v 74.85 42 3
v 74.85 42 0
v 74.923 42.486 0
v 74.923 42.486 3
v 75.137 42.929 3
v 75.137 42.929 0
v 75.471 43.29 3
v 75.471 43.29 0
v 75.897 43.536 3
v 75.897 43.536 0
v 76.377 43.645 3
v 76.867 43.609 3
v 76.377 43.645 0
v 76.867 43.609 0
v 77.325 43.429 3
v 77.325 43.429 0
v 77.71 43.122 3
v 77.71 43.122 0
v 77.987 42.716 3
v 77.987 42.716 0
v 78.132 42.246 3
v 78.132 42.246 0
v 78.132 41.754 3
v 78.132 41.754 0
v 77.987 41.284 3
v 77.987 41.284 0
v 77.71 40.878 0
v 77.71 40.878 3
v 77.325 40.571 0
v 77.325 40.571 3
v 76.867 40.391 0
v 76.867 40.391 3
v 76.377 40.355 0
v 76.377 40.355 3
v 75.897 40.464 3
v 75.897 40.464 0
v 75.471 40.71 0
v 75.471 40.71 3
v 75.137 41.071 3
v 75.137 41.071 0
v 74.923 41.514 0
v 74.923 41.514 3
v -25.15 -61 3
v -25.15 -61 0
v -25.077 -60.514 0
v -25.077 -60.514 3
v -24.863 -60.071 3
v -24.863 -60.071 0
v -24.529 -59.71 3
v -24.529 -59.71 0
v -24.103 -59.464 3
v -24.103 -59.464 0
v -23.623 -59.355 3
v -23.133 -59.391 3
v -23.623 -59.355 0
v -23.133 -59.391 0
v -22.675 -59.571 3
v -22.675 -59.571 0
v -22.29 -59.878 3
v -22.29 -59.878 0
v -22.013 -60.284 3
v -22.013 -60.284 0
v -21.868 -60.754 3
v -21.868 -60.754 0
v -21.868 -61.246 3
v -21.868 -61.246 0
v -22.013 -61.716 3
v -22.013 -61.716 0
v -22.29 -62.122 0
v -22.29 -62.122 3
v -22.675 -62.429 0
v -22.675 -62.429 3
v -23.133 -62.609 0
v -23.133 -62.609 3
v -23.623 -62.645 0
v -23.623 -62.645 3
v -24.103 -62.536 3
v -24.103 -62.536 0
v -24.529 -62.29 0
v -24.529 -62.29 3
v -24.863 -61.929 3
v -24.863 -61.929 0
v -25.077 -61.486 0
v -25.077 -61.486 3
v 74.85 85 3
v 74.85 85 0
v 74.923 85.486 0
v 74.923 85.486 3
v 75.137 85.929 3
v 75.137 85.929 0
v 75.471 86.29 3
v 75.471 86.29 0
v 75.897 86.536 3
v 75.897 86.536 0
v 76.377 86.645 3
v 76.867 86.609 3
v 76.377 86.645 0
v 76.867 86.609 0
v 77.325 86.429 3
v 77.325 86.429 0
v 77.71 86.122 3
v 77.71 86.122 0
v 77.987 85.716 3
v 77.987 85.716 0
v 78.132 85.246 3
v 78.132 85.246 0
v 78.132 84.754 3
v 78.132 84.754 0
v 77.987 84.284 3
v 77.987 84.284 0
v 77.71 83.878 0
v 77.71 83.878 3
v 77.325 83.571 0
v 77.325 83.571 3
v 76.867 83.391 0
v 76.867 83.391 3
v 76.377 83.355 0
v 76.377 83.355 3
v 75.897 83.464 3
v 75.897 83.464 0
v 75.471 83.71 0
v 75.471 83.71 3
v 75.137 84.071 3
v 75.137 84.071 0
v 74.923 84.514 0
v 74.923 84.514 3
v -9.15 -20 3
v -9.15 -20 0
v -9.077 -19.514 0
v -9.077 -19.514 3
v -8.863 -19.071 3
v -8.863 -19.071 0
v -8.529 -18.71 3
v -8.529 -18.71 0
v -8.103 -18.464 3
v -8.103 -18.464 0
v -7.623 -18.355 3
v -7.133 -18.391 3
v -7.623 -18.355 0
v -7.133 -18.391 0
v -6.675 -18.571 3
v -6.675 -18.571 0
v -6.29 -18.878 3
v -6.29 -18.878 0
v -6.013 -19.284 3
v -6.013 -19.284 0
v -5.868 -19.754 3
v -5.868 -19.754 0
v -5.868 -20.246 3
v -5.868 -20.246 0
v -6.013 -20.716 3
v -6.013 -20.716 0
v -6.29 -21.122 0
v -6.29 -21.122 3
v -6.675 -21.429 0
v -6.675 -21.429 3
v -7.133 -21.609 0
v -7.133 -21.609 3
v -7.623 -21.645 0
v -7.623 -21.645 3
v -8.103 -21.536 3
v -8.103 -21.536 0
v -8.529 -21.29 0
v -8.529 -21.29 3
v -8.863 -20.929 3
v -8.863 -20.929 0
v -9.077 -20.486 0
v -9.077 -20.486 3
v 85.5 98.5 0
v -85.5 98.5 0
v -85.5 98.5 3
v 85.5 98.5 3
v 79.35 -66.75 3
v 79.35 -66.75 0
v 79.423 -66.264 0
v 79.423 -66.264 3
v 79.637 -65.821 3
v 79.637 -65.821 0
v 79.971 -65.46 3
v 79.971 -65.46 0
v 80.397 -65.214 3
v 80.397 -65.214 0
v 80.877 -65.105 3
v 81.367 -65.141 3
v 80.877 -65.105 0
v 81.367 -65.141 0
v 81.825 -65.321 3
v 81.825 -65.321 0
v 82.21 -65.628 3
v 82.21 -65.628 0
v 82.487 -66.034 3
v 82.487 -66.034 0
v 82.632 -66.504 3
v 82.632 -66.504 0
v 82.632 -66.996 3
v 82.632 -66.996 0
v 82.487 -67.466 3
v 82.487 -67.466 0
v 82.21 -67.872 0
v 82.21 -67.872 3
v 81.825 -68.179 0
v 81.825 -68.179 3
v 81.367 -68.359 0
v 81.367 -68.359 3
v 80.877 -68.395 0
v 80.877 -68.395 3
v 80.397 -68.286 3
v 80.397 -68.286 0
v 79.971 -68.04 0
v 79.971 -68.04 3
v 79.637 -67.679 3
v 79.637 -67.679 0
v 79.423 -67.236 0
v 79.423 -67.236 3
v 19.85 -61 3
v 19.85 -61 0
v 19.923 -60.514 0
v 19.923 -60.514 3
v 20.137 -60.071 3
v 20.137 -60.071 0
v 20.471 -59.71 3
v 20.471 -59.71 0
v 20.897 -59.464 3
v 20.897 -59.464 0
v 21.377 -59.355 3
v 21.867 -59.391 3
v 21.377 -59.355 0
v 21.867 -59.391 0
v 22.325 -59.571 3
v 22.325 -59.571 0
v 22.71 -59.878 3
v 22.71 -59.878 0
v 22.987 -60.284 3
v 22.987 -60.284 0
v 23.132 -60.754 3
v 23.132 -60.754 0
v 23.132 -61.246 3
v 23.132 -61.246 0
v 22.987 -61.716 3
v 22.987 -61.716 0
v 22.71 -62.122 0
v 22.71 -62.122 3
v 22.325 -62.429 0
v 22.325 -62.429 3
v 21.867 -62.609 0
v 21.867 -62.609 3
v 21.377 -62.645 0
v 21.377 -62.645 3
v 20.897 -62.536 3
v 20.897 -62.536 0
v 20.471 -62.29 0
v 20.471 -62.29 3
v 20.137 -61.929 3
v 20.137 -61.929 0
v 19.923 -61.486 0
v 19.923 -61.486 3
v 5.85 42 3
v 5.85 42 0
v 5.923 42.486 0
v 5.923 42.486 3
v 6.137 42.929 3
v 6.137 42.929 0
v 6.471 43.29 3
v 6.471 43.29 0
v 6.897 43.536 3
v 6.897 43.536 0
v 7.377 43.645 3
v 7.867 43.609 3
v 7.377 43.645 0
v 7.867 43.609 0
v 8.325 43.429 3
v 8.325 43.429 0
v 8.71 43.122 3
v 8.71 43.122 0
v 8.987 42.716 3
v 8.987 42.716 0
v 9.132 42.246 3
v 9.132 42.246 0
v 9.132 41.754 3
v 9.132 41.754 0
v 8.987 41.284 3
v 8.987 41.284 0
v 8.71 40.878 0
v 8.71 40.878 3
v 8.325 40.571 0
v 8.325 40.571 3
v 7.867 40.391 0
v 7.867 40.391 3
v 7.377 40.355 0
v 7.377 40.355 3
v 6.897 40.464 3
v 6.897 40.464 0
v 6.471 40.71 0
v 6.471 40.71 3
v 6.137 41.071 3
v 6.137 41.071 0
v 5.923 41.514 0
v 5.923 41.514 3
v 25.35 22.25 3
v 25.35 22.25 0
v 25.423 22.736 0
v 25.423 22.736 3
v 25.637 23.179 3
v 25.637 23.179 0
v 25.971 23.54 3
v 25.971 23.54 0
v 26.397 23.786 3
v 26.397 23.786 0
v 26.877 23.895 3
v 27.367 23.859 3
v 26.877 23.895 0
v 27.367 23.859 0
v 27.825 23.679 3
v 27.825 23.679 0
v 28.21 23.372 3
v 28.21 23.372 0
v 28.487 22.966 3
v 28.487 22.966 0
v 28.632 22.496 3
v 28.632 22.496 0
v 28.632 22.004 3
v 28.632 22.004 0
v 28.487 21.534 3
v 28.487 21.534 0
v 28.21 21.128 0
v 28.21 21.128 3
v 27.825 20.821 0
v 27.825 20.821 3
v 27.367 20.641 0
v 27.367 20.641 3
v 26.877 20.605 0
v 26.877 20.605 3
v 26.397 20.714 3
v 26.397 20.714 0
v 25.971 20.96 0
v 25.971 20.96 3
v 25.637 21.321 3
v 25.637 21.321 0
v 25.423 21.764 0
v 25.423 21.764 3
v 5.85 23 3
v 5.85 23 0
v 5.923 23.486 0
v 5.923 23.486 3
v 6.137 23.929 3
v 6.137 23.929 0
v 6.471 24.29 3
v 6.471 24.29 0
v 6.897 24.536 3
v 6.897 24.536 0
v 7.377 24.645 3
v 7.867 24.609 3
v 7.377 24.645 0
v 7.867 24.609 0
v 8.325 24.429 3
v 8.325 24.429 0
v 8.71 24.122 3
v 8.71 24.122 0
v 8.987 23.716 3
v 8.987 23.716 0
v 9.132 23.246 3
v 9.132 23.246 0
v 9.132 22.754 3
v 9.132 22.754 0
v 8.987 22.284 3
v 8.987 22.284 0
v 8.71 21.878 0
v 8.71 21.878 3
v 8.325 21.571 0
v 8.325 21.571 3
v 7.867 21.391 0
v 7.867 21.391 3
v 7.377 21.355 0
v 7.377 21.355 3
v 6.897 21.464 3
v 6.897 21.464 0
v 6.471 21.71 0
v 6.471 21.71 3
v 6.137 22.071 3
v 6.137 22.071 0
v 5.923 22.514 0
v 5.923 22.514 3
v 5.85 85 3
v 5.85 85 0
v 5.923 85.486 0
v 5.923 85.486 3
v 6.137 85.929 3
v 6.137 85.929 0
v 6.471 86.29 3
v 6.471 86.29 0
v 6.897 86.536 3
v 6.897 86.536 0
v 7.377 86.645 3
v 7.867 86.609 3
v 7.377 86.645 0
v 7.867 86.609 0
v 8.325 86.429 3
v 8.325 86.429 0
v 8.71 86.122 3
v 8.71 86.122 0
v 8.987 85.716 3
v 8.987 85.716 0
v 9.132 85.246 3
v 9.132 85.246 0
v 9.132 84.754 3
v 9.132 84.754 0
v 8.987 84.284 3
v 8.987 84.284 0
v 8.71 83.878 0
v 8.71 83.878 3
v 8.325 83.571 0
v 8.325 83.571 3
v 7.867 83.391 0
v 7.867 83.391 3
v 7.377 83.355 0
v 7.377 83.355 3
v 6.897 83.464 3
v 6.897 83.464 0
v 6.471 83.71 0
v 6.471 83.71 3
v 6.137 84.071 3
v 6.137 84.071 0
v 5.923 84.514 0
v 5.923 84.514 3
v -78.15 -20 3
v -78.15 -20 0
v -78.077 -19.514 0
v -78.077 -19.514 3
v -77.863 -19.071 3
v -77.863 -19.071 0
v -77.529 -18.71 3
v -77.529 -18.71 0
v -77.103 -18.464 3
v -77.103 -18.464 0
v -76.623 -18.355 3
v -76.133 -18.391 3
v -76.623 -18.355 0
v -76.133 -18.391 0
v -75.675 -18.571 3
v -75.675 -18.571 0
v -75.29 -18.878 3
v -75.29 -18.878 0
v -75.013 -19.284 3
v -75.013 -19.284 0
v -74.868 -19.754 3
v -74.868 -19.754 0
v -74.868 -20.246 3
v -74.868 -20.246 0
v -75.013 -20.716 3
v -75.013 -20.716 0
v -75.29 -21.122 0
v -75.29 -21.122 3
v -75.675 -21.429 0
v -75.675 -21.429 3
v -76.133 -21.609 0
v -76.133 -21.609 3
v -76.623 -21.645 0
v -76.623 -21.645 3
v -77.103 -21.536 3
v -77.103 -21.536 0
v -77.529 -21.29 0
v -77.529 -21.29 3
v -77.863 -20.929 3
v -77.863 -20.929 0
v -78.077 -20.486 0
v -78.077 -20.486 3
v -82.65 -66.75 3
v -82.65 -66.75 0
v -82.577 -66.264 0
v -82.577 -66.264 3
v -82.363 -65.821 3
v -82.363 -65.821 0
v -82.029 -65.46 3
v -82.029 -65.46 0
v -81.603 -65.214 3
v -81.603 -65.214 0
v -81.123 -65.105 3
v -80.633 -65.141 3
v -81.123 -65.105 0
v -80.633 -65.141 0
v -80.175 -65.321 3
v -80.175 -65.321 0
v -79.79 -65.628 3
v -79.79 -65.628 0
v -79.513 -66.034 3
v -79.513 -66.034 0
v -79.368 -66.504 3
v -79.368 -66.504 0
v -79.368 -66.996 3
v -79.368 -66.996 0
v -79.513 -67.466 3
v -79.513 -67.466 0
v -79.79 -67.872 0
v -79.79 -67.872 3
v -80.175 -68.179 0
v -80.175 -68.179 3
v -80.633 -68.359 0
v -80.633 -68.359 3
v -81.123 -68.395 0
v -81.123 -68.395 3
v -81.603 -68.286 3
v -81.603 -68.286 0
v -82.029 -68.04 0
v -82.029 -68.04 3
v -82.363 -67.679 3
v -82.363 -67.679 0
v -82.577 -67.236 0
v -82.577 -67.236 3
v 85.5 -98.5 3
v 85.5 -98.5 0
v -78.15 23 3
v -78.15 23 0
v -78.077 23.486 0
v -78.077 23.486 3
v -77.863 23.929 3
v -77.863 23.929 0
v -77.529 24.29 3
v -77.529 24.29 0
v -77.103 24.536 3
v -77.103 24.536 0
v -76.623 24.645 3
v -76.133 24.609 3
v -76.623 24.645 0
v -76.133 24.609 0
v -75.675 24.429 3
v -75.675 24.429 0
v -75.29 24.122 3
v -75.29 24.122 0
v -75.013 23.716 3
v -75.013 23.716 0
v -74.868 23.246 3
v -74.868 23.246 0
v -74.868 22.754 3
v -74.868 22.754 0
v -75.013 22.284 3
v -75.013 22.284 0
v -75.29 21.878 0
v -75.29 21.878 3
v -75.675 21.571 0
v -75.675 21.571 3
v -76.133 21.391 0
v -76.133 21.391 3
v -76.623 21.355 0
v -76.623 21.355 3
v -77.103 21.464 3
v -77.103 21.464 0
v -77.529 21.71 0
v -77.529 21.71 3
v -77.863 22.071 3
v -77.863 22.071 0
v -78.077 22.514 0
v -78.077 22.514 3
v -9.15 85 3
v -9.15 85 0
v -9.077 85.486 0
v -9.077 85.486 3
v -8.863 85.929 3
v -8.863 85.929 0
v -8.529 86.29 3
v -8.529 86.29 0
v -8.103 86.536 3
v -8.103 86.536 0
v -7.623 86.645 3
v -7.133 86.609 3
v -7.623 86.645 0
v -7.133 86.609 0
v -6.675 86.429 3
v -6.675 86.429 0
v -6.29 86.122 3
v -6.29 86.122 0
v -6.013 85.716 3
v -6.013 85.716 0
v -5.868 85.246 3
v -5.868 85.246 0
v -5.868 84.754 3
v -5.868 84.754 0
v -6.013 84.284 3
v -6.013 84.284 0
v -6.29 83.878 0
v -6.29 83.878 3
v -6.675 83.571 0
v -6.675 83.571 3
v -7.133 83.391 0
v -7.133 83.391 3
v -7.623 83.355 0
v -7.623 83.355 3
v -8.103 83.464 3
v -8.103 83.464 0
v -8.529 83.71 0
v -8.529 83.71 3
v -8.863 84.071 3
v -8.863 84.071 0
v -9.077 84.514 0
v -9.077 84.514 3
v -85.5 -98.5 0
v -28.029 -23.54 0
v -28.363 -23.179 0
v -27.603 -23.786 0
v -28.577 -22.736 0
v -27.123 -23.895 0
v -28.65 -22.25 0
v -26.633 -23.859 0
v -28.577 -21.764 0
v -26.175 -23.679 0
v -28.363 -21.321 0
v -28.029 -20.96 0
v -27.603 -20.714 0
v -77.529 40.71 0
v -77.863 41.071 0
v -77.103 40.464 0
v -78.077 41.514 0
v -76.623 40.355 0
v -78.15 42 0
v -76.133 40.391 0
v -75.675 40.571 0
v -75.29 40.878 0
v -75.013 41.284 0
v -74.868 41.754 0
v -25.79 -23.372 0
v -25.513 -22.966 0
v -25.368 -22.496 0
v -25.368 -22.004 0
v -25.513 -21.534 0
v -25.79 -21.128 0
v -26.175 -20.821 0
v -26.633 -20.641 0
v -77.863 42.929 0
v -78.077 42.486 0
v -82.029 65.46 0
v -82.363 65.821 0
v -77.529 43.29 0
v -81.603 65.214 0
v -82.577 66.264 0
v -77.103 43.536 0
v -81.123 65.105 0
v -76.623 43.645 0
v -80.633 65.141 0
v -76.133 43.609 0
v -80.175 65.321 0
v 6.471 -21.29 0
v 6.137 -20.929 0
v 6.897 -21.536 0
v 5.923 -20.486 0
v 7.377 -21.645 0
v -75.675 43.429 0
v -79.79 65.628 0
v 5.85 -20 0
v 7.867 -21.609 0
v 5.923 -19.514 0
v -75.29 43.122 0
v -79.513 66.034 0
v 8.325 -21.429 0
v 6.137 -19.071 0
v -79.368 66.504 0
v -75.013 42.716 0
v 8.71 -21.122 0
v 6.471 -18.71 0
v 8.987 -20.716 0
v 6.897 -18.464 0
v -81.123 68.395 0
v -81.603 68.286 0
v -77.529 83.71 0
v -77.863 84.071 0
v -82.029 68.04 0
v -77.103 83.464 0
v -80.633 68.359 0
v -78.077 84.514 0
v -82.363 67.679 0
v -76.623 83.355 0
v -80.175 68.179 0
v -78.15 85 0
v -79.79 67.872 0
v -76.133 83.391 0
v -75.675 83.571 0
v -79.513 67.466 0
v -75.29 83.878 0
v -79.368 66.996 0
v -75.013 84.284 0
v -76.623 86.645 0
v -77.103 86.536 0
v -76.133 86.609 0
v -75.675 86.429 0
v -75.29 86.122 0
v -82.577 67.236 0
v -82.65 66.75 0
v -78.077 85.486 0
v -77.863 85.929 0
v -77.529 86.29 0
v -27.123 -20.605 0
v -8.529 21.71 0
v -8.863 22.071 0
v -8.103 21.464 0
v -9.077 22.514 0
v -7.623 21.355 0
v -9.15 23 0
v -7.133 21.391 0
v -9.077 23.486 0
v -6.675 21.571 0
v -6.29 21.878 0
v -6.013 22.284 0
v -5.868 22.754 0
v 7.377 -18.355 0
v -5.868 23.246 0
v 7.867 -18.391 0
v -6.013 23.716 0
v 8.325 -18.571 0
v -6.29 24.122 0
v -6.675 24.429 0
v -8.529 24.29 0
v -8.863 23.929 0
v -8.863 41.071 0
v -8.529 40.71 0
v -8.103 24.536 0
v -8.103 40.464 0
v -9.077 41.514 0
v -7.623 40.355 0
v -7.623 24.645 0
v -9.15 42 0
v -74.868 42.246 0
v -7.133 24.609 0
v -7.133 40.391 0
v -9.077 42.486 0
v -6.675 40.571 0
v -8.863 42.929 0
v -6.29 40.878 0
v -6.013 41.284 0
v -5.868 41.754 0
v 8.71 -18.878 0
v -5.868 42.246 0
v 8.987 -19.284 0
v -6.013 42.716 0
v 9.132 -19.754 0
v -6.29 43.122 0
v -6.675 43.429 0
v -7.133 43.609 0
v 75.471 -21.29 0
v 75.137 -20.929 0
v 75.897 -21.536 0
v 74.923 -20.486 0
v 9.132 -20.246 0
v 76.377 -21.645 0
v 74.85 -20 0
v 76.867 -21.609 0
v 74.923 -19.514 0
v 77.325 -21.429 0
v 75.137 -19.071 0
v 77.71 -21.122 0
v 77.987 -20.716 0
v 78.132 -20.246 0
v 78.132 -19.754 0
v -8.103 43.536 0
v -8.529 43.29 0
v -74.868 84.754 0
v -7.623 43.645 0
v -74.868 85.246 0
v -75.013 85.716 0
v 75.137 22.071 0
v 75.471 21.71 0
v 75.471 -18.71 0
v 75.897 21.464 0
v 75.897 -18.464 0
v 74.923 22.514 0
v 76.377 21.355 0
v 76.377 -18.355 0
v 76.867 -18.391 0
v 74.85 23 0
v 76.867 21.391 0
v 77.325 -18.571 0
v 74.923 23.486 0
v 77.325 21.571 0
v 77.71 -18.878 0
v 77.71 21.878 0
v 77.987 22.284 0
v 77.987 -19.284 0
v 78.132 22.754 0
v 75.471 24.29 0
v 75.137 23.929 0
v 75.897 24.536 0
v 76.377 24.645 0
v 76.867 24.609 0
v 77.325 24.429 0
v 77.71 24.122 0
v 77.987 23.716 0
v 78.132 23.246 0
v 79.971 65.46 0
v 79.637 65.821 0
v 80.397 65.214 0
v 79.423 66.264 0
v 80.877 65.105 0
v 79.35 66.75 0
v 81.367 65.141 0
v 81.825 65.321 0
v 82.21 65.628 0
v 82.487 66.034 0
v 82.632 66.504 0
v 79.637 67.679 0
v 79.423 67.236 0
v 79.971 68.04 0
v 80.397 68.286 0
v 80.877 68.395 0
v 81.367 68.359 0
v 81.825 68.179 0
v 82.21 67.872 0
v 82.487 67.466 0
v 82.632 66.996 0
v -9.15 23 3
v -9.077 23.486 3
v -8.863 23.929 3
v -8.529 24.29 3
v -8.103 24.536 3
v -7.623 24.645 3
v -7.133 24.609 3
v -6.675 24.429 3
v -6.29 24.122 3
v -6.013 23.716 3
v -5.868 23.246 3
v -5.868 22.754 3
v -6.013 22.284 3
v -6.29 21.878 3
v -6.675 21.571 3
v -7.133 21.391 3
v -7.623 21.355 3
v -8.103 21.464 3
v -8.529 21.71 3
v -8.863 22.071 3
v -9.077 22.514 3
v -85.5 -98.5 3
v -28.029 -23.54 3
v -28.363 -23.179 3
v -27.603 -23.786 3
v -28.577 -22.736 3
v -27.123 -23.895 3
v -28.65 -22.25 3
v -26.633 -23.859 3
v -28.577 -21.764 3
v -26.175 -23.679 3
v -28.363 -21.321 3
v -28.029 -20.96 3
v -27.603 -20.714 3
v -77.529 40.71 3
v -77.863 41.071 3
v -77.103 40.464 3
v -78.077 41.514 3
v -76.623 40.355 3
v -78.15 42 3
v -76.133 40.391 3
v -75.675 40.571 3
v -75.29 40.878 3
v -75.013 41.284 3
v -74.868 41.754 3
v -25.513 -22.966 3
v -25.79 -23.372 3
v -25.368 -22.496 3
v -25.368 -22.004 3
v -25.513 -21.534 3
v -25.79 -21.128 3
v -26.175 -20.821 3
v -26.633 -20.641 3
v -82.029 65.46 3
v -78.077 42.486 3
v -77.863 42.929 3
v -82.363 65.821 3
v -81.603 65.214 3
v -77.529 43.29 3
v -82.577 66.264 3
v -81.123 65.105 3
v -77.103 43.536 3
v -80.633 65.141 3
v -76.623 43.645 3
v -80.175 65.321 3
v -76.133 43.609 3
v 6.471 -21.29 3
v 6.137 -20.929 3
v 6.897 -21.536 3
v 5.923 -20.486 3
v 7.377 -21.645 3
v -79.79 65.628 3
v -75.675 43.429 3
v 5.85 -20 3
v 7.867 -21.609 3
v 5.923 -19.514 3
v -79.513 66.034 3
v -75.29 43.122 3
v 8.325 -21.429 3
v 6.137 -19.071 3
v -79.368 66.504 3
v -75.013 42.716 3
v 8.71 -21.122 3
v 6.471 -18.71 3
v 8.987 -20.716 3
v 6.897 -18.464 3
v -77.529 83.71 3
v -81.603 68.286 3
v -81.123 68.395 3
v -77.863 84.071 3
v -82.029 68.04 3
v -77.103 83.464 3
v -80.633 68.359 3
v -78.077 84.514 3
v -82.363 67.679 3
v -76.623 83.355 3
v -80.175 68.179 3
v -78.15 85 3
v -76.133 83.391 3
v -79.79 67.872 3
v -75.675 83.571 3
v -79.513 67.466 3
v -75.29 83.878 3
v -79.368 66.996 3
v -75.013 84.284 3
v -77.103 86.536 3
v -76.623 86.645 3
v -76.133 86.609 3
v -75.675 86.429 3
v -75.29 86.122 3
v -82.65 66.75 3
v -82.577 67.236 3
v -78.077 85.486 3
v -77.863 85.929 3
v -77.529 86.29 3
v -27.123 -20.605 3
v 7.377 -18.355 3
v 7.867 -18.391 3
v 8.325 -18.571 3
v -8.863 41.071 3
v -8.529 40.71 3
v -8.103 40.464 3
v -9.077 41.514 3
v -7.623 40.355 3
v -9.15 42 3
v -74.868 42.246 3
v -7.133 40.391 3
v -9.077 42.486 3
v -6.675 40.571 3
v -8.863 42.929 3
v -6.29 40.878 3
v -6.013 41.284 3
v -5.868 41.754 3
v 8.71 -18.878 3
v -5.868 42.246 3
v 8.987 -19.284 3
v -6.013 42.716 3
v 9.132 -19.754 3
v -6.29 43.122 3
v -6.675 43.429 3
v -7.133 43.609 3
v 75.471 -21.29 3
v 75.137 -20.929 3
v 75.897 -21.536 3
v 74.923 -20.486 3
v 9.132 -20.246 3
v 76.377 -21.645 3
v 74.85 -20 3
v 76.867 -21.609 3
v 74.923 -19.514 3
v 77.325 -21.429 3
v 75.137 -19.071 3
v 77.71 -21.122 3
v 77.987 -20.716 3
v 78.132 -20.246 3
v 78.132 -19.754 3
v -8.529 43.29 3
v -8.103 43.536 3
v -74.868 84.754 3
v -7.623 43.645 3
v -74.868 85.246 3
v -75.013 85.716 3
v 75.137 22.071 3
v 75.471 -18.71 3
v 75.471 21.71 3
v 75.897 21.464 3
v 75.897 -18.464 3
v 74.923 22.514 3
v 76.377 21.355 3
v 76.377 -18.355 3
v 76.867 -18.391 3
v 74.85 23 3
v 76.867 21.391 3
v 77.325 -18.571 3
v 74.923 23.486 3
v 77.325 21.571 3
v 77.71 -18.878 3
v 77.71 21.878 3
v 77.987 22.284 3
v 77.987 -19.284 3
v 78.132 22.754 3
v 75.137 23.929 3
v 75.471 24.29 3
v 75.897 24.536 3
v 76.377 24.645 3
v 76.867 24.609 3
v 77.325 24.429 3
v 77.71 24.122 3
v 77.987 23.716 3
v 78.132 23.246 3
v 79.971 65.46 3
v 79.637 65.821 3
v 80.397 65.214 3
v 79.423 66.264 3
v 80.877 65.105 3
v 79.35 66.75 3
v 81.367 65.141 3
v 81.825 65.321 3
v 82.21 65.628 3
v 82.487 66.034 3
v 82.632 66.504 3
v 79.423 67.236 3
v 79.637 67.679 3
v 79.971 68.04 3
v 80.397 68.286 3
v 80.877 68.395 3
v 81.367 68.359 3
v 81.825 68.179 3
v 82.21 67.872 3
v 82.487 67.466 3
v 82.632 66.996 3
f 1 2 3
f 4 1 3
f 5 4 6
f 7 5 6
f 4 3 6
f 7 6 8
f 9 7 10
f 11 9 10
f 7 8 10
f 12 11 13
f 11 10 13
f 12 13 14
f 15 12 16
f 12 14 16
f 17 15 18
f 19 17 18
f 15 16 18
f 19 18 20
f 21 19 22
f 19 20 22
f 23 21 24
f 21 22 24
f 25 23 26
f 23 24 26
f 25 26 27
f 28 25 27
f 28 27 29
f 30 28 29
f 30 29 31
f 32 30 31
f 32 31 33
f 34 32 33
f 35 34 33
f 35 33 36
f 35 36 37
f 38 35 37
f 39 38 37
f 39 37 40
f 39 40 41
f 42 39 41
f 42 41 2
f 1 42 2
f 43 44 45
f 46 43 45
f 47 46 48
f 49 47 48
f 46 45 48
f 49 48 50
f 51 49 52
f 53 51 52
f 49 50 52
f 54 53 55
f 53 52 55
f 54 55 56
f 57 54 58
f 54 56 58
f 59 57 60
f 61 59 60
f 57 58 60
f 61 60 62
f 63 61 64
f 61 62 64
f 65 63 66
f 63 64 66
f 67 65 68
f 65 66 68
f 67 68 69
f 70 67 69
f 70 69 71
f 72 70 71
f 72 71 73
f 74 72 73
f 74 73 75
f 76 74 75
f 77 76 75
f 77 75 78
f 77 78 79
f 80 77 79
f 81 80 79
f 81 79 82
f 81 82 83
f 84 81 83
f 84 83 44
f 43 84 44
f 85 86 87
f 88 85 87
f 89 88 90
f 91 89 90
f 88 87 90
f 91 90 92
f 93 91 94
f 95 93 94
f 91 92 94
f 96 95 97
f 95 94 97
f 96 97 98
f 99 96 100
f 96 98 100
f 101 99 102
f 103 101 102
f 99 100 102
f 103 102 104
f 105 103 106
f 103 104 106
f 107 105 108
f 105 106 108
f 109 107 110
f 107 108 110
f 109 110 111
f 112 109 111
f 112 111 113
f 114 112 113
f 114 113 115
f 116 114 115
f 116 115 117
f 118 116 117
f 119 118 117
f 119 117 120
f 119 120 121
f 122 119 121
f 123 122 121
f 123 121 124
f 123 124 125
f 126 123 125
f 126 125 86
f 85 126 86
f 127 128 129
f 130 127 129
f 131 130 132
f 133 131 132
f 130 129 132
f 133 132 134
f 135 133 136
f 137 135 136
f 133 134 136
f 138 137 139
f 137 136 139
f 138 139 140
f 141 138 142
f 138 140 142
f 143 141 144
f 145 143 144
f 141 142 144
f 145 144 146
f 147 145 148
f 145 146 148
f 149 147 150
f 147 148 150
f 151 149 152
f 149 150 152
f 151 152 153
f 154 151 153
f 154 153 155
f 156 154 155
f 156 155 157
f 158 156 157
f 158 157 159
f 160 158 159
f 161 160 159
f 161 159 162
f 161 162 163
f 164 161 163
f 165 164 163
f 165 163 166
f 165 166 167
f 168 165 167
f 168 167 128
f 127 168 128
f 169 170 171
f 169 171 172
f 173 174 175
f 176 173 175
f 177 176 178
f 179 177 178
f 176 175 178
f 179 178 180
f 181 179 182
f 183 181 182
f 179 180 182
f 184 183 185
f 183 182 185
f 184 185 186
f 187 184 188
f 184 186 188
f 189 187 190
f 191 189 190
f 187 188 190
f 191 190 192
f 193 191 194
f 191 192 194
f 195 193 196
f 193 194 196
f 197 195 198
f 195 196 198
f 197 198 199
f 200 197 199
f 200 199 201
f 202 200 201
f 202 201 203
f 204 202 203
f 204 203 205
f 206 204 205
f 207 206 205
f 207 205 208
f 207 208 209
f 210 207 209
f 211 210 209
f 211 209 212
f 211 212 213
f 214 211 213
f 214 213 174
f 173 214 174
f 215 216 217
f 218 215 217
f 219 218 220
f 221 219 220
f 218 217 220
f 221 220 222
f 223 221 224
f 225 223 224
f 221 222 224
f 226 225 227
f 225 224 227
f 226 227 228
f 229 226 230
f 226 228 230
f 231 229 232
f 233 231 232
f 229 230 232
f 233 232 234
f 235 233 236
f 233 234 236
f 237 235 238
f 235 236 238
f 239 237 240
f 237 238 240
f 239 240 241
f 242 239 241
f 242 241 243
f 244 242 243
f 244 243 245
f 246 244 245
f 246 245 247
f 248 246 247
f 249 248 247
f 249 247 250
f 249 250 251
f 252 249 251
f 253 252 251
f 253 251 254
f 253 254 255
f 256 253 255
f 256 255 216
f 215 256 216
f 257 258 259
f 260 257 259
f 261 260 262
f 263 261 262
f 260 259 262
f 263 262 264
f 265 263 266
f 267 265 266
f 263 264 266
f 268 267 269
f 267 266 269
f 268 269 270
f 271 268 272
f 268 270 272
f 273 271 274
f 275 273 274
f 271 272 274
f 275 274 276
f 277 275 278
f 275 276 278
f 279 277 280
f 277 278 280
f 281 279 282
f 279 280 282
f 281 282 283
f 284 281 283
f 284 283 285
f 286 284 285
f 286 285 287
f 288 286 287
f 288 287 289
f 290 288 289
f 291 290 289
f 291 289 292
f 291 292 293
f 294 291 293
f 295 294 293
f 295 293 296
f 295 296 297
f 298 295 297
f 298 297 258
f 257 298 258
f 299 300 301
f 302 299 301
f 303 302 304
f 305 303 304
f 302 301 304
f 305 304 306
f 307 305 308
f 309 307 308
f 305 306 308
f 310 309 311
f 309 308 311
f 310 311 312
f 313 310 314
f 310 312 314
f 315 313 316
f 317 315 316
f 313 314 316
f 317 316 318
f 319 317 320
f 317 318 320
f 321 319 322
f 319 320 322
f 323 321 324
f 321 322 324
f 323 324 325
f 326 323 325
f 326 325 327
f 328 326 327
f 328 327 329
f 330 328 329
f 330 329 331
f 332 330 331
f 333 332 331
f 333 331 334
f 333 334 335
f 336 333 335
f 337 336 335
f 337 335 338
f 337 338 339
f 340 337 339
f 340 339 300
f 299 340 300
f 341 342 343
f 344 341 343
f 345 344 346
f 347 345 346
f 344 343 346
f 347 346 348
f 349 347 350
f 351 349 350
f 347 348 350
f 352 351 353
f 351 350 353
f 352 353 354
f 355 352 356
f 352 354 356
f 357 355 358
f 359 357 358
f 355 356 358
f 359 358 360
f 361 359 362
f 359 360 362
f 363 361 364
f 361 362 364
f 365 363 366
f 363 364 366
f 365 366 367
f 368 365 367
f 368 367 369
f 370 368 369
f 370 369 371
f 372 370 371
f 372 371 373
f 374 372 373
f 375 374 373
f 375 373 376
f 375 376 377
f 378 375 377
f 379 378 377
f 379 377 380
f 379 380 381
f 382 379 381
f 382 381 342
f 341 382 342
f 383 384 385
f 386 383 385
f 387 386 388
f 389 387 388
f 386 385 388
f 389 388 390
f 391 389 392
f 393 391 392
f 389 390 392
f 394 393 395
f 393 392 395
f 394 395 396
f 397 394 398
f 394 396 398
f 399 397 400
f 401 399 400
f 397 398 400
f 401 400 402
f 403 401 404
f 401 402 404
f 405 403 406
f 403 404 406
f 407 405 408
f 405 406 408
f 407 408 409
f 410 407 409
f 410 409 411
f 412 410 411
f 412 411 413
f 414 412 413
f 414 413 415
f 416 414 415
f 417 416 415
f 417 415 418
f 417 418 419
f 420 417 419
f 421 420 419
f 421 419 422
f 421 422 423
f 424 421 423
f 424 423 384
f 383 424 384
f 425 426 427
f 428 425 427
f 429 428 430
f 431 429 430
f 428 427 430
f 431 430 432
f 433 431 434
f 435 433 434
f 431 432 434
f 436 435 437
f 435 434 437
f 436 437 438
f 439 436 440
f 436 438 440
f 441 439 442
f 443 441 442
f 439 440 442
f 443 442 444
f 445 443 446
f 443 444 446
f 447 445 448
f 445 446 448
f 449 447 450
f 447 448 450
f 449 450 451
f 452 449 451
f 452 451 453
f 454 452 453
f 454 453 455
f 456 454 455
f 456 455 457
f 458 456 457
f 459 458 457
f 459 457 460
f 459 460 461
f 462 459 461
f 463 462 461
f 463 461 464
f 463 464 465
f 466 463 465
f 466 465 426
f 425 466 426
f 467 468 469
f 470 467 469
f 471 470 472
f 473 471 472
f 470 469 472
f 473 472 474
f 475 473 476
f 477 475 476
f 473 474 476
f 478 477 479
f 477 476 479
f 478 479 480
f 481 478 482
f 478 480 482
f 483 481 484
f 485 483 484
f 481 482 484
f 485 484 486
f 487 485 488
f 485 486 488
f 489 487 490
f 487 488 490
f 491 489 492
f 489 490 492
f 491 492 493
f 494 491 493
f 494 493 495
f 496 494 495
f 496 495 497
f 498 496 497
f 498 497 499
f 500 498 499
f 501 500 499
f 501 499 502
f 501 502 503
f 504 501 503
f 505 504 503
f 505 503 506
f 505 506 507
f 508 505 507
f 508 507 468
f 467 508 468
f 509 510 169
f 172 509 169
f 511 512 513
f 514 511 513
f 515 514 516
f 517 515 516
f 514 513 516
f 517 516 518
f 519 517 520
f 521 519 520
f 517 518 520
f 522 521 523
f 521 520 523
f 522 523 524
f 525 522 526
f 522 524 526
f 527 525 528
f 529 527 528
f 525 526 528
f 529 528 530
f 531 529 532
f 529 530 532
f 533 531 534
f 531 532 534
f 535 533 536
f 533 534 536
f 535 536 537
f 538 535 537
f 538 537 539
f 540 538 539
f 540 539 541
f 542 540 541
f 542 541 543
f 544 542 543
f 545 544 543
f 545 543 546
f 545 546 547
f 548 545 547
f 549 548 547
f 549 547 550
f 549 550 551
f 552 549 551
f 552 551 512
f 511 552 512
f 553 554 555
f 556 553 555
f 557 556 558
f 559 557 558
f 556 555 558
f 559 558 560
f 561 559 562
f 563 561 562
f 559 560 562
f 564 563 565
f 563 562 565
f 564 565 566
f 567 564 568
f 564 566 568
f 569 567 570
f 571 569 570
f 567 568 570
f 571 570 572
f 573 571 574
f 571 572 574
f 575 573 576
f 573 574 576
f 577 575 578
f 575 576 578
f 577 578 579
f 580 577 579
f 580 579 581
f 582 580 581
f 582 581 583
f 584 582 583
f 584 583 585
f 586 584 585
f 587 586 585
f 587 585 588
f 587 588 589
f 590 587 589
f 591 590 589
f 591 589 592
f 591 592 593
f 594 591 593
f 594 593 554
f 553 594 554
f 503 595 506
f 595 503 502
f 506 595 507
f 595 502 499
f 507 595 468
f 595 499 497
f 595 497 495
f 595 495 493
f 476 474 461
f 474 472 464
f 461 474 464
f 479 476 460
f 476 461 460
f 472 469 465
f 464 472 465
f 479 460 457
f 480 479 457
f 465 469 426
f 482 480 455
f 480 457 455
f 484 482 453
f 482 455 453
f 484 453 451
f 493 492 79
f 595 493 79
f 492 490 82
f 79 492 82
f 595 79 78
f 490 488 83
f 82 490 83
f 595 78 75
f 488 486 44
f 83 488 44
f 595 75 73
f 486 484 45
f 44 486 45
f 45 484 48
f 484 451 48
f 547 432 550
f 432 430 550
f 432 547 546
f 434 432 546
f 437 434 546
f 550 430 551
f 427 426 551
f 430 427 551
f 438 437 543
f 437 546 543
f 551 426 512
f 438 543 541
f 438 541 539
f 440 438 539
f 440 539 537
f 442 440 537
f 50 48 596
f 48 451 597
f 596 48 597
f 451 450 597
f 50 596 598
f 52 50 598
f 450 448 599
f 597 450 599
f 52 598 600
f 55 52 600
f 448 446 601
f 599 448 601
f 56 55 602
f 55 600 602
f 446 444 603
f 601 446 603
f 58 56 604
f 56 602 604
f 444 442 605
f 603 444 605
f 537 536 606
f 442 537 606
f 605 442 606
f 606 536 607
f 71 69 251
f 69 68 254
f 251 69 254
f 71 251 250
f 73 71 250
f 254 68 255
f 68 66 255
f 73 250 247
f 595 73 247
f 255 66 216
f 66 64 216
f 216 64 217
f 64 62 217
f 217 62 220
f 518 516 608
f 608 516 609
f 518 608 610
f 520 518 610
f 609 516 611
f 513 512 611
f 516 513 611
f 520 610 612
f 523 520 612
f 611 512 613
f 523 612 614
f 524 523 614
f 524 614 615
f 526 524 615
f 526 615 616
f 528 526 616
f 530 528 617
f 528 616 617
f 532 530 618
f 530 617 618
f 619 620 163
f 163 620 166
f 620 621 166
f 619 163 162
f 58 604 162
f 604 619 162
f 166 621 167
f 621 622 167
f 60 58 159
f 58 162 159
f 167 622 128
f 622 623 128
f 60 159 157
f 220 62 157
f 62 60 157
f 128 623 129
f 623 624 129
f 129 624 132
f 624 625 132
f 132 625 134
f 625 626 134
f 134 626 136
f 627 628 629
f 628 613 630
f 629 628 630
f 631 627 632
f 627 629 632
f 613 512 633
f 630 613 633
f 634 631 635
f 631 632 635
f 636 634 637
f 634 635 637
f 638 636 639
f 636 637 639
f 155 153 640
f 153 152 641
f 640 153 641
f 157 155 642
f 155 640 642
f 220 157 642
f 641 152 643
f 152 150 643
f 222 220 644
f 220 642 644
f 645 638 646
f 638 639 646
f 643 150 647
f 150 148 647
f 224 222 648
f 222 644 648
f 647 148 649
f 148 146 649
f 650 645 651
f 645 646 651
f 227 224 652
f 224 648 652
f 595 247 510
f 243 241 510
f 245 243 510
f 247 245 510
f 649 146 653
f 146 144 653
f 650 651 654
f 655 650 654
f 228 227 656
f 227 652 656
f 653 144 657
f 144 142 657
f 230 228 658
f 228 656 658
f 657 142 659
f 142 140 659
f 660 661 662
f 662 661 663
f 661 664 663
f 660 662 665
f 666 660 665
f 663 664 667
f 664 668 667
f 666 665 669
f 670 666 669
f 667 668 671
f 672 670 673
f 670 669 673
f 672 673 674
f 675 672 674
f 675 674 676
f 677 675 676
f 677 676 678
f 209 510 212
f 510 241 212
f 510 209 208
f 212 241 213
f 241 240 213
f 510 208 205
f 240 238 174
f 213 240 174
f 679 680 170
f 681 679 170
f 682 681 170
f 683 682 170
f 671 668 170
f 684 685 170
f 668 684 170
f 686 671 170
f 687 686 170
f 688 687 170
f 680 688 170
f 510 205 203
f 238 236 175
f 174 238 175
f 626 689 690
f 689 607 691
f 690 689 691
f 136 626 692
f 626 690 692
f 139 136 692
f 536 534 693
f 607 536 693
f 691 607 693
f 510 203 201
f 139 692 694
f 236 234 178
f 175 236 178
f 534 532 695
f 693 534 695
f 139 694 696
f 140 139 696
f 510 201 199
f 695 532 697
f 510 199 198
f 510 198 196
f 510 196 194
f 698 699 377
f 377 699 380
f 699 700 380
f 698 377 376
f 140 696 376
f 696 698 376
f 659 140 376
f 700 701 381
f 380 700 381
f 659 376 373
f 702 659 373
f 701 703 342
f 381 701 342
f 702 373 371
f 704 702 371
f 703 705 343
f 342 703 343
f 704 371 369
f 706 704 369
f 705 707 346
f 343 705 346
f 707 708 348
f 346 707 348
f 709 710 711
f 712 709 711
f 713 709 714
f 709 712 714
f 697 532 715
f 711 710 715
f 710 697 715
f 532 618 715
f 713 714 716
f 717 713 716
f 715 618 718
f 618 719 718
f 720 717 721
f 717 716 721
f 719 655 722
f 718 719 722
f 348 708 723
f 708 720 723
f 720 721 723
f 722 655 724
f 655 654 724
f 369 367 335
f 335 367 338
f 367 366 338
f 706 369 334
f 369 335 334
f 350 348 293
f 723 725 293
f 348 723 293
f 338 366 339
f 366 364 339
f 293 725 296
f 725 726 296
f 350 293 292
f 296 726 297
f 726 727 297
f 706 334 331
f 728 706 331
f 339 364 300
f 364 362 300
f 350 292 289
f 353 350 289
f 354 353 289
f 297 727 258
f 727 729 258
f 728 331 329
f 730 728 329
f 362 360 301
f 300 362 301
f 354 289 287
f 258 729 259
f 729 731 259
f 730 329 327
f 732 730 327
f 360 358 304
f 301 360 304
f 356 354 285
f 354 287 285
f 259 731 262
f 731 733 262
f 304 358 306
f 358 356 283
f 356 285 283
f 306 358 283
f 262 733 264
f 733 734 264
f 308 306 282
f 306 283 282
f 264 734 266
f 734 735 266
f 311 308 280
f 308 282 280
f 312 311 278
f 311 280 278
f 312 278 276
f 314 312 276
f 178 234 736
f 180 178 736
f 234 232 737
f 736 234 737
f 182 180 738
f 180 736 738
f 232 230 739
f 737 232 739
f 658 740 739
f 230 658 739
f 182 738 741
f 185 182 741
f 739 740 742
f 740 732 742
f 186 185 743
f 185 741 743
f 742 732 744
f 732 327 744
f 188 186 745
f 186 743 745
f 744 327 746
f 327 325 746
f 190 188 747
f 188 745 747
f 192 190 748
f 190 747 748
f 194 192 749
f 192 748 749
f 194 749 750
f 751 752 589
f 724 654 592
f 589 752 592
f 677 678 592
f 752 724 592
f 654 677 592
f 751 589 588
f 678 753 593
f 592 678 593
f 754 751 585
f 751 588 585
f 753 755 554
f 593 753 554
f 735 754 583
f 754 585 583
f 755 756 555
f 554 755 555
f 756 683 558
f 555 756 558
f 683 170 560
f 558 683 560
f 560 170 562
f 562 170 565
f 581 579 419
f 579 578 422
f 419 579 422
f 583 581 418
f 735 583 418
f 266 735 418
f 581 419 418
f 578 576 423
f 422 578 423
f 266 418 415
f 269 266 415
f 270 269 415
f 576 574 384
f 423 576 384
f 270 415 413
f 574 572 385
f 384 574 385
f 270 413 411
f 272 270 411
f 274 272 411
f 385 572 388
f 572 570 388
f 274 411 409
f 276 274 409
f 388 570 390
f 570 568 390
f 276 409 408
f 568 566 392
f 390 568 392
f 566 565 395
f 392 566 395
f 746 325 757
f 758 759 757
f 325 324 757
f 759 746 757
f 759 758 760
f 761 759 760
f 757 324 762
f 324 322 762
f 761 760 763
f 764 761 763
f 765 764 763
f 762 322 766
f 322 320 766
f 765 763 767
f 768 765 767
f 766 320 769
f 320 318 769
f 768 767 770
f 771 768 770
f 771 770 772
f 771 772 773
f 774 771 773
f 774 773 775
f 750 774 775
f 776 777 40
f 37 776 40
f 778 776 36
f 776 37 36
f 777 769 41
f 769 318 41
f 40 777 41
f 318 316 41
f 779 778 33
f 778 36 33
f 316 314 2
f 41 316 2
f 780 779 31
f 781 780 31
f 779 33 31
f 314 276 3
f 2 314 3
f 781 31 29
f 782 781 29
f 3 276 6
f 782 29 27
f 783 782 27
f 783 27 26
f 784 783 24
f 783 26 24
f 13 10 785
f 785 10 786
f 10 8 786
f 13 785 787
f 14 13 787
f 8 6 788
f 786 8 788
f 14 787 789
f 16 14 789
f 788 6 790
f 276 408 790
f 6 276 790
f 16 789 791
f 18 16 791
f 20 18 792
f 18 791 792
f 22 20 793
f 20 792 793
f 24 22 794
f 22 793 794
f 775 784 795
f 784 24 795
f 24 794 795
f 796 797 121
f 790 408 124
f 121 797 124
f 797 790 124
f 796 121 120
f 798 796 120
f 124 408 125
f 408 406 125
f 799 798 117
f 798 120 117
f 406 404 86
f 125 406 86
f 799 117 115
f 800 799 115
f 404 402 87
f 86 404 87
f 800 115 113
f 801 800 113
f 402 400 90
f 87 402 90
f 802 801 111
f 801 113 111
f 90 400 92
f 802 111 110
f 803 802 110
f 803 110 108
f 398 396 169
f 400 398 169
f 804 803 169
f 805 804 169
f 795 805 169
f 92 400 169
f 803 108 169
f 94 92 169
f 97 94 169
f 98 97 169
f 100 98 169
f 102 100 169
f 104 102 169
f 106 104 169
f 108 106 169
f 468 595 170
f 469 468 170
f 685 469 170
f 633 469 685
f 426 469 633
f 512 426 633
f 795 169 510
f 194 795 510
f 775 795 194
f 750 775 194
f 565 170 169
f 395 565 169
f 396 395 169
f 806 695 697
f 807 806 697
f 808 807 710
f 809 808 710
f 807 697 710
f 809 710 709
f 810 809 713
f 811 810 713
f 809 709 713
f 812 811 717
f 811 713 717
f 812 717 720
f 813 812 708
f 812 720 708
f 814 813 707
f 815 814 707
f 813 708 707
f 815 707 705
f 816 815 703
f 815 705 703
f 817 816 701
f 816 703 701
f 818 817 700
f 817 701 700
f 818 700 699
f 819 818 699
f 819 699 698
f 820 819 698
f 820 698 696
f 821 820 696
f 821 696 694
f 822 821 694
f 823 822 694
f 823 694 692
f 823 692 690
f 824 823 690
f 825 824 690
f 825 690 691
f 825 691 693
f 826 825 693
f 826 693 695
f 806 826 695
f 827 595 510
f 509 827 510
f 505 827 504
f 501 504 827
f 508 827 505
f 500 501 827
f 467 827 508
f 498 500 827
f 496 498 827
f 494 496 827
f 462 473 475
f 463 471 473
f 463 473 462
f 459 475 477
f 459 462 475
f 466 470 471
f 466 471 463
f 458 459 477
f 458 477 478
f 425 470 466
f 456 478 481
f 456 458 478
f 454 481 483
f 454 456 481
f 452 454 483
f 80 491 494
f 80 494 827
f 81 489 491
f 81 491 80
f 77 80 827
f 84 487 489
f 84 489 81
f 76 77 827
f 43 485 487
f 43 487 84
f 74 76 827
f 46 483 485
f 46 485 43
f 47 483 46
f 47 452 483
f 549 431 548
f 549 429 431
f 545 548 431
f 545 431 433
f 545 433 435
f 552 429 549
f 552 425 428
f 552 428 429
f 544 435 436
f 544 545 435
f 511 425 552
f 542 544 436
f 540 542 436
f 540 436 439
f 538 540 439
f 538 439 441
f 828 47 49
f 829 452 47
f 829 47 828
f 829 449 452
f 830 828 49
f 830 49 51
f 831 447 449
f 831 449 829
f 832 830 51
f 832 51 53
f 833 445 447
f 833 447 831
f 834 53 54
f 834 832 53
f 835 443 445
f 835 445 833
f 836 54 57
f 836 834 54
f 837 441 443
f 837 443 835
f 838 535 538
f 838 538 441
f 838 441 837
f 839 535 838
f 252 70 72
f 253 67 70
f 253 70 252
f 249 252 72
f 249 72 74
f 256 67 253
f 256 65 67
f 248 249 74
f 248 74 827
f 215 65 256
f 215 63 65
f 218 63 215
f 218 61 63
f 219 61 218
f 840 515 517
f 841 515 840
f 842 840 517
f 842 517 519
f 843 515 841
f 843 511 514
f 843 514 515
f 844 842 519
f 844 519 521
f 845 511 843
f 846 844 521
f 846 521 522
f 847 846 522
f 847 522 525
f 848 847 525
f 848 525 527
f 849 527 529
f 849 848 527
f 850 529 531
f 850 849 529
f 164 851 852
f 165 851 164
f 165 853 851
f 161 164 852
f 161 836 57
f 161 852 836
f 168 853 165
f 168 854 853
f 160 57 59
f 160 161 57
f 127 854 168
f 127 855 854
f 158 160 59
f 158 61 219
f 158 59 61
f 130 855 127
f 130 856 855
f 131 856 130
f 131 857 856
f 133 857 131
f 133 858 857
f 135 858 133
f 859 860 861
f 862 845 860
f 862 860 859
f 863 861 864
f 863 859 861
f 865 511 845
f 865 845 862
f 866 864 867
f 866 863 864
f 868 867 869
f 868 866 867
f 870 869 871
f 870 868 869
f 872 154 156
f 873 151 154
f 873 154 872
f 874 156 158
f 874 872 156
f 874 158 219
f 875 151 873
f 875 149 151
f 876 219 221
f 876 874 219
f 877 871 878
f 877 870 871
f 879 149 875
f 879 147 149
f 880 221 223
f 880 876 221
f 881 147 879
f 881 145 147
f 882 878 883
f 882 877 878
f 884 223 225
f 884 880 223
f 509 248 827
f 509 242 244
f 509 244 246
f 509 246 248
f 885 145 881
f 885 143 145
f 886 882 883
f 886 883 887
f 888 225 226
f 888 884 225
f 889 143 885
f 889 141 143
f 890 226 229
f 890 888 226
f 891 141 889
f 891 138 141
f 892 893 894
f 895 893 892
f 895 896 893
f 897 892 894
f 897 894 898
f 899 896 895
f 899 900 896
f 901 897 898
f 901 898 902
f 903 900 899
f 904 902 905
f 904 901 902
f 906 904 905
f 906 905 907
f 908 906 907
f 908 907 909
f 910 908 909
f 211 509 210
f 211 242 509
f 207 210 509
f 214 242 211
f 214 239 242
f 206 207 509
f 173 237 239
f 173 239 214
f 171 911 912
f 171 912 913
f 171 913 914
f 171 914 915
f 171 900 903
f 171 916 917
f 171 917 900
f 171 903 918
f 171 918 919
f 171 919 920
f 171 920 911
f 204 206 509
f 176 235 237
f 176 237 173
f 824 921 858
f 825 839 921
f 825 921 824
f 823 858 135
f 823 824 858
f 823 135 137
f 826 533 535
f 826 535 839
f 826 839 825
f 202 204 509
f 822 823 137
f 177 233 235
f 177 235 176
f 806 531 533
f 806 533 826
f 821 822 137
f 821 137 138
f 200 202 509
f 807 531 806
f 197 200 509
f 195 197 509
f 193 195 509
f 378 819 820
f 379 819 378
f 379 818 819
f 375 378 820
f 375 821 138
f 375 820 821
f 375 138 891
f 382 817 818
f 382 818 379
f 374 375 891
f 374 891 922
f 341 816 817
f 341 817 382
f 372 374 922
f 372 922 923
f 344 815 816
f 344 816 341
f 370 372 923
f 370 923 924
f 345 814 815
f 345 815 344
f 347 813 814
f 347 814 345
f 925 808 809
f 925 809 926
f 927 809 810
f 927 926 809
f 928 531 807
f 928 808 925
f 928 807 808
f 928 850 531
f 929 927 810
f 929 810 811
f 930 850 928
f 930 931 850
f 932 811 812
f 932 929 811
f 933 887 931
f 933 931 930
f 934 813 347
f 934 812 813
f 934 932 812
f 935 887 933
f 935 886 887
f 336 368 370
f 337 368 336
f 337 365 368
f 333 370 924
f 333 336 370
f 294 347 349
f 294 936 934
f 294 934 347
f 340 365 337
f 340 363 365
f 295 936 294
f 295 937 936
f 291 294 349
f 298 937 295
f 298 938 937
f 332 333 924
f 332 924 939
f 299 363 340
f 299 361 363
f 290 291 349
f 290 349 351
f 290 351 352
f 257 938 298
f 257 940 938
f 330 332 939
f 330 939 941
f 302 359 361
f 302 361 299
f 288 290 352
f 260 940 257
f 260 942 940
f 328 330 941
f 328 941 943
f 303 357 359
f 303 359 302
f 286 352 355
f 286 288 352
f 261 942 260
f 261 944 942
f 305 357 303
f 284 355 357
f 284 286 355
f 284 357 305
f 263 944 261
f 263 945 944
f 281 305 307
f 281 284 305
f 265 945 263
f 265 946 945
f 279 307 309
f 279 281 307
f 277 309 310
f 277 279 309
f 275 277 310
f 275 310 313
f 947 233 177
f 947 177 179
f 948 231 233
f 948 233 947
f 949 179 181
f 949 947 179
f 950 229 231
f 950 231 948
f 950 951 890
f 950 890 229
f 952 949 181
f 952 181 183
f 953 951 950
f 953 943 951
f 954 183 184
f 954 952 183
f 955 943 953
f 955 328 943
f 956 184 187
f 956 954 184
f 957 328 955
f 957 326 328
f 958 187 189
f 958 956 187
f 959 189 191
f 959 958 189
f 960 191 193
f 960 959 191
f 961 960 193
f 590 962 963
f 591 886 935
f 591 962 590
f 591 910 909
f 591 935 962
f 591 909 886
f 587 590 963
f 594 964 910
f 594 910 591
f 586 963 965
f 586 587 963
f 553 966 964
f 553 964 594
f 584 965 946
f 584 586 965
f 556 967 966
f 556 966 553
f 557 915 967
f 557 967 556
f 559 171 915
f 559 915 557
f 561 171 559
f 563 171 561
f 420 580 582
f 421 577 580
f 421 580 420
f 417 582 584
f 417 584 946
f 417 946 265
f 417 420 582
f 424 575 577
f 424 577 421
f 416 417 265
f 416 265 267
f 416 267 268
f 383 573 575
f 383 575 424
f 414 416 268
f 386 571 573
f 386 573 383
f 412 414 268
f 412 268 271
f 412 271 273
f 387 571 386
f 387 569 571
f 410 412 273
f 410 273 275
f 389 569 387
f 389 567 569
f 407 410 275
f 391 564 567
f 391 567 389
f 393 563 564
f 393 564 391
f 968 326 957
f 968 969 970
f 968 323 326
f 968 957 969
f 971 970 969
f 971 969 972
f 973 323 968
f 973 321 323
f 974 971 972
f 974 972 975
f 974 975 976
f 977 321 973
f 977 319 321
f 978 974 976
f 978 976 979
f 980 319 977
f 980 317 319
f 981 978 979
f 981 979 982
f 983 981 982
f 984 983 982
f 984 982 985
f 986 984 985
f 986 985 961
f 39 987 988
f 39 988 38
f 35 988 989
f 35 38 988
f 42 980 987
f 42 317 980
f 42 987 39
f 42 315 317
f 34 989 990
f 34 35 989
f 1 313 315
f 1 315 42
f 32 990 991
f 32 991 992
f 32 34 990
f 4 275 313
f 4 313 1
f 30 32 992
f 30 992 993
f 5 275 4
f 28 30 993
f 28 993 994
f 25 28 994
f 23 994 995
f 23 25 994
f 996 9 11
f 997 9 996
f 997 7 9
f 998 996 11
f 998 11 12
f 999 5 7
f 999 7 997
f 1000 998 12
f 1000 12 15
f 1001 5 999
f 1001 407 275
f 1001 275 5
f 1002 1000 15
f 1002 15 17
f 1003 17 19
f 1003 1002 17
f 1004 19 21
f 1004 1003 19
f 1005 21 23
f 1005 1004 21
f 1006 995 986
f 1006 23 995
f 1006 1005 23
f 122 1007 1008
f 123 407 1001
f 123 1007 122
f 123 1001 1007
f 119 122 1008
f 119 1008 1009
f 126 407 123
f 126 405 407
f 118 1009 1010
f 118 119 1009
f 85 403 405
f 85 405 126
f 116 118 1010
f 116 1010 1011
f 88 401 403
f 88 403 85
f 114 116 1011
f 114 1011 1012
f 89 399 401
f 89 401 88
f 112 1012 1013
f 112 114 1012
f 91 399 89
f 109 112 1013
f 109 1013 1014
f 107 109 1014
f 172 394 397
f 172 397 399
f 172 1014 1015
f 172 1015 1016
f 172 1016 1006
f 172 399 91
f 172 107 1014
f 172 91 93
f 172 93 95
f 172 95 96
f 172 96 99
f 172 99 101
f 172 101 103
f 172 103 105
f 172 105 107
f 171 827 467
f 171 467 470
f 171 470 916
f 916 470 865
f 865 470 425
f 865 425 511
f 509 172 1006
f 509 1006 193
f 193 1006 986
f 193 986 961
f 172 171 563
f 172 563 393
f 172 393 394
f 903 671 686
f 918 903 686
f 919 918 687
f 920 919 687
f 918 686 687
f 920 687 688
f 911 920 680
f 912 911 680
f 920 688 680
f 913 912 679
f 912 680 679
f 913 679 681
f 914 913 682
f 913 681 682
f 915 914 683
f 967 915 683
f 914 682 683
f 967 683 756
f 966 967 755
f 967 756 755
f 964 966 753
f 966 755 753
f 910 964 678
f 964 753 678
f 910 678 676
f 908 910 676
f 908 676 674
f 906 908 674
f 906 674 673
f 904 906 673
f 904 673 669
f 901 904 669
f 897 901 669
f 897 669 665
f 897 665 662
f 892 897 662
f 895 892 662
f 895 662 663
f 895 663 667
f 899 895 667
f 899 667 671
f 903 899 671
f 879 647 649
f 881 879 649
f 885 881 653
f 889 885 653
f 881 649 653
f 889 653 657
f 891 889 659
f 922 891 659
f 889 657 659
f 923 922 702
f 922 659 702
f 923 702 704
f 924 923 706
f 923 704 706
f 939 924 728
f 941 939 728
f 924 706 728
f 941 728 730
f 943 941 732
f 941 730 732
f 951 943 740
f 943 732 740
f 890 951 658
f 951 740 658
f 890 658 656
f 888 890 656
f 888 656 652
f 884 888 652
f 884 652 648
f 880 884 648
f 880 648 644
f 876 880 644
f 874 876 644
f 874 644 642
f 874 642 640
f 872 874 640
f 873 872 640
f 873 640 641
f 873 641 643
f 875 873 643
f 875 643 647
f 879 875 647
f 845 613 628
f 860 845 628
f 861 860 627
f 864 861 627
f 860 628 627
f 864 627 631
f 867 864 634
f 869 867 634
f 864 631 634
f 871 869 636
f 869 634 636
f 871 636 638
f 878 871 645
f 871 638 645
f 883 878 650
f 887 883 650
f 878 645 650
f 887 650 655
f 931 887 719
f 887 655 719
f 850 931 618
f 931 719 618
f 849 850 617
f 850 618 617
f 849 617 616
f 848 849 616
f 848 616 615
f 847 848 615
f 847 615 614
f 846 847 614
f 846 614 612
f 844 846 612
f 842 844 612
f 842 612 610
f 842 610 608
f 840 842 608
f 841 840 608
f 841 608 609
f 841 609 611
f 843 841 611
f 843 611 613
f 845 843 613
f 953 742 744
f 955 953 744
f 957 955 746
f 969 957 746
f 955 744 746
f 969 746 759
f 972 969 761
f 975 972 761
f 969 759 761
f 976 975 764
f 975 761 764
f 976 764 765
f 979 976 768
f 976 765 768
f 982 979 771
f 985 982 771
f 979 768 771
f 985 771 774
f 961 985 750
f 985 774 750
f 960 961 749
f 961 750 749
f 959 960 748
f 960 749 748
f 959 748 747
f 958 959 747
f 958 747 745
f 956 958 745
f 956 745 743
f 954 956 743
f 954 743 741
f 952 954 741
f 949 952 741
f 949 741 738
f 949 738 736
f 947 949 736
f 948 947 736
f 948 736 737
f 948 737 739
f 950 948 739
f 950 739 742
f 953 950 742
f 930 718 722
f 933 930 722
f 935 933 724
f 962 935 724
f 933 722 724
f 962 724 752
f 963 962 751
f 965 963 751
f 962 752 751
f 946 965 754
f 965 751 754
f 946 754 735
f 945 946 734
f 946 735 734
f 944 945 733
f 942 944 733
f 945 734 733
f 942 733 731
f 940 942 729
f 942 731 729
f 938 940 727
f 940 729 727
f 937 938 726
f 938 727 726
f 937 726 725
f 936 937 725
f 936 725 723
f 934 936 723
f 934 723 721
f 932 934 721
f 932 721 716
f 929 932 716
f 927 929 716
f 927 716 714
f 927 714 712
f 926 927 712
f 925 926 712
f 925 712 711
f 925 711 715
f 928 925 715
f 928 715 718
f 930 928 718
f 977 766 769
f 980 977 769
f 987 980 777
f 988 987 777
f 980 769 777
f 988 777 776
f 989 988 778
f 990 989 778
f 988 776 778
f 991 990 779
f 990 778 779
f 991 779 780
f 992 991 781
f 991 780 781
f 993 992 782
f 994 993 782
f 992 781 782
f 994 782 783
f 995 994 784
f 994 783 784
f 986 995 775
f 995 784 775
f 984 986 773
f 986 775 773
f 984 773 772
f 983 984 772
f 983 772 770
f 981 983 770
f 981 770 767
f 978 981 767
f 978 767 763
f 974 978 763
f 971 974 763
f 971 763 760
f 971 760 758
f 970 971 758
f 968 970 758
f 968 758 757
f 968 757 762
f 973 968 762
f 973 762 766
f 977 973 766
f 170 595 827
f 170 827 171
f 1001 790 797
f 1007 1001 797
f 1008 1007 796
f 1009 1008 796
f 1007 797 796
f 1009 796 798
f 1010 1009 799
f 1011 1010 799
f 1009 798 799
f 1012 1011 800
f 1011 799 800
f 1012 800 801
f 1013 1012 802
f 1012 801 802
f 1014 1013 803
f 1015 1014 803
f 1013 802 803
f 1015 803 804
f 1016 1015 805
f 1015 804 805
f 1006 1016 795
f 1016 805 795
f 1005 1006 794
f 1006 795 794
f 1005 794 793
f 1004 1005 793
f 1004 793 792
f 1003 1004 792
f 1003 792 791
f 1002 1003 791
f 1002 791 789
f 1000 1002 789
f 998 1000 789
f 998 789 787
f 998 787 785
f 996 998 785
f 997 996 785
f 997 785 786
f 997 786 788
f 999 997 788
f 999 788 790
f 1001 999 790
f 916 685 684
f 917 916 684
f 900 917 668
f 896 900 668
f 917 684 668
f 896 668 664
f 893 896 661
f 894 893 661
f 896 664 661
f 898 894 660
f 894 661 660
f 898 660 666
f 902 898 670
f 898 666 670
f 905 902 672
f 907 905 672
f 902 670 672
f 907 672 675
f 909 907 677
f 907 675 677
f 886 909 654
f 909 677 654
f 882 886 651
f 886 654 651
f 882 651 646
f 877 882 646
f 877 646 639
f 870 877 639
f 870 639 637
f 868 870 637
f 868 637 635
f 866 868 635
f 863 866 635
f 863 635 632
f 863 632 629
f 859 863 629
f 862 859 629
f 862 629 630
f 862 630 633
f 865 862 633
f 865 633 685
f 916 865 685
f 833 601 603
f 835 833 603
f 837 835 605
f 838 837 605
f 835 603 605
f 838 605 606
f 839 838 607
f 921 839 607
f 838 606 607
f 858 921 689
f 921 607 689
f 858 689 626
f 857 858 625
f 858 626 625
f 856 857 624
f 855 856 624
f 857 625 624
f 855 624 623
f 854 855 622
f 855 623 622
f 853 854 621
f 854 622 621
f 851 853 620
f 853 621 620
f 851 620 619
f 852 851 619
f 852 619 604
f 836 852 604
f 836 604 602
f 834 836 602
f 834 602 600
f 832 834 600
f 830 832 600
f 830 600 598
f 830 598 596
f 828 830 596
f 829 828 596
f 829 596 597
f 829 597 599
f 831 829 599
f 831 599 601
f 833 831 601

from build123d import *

# Parameters (mm, degrees)
F0_W     = 171
F0_H     = 197
F1_DEPTH = 3
F3_D     = 3.3
F5_D     = 3.3


with BuildPart() as f1:
    # F0 (on Top) → F1 (new body)
    with BuildSketch(Plane.XY):
        Rectangle(F0_W, F0_H)
    extrude(amount=F1_DEPTH)

    # F3 (through all)
    with Locations(Plane.XY.offset(3)):
        with Locations((-76.5, 85), (-7.5, 85), (-7.5, 42), (-76.5, 42), (-76.5, -20), (-76.5, 23), (-7.5, 23), (-7.5, -20), (7.5, -20), (7.5, 23), (76.5, 23), (76.5, -20), (7.5, 42), (76.5, 42), (76.5, 85), (7.5, 85), (21.5, -61), (-23.5, -61)):
            Hole(F3_D / 2)

    # F5 (through all)
    with Locations(Plane.XY.offset(3)):
        with Locations((-81, 66.75), (81, 66.75), (27, 22.25), (-27, -22.25), (-81, -66.75), (81, -66.75)):
            Hole(F5_D / 2)


solid = f1.part
